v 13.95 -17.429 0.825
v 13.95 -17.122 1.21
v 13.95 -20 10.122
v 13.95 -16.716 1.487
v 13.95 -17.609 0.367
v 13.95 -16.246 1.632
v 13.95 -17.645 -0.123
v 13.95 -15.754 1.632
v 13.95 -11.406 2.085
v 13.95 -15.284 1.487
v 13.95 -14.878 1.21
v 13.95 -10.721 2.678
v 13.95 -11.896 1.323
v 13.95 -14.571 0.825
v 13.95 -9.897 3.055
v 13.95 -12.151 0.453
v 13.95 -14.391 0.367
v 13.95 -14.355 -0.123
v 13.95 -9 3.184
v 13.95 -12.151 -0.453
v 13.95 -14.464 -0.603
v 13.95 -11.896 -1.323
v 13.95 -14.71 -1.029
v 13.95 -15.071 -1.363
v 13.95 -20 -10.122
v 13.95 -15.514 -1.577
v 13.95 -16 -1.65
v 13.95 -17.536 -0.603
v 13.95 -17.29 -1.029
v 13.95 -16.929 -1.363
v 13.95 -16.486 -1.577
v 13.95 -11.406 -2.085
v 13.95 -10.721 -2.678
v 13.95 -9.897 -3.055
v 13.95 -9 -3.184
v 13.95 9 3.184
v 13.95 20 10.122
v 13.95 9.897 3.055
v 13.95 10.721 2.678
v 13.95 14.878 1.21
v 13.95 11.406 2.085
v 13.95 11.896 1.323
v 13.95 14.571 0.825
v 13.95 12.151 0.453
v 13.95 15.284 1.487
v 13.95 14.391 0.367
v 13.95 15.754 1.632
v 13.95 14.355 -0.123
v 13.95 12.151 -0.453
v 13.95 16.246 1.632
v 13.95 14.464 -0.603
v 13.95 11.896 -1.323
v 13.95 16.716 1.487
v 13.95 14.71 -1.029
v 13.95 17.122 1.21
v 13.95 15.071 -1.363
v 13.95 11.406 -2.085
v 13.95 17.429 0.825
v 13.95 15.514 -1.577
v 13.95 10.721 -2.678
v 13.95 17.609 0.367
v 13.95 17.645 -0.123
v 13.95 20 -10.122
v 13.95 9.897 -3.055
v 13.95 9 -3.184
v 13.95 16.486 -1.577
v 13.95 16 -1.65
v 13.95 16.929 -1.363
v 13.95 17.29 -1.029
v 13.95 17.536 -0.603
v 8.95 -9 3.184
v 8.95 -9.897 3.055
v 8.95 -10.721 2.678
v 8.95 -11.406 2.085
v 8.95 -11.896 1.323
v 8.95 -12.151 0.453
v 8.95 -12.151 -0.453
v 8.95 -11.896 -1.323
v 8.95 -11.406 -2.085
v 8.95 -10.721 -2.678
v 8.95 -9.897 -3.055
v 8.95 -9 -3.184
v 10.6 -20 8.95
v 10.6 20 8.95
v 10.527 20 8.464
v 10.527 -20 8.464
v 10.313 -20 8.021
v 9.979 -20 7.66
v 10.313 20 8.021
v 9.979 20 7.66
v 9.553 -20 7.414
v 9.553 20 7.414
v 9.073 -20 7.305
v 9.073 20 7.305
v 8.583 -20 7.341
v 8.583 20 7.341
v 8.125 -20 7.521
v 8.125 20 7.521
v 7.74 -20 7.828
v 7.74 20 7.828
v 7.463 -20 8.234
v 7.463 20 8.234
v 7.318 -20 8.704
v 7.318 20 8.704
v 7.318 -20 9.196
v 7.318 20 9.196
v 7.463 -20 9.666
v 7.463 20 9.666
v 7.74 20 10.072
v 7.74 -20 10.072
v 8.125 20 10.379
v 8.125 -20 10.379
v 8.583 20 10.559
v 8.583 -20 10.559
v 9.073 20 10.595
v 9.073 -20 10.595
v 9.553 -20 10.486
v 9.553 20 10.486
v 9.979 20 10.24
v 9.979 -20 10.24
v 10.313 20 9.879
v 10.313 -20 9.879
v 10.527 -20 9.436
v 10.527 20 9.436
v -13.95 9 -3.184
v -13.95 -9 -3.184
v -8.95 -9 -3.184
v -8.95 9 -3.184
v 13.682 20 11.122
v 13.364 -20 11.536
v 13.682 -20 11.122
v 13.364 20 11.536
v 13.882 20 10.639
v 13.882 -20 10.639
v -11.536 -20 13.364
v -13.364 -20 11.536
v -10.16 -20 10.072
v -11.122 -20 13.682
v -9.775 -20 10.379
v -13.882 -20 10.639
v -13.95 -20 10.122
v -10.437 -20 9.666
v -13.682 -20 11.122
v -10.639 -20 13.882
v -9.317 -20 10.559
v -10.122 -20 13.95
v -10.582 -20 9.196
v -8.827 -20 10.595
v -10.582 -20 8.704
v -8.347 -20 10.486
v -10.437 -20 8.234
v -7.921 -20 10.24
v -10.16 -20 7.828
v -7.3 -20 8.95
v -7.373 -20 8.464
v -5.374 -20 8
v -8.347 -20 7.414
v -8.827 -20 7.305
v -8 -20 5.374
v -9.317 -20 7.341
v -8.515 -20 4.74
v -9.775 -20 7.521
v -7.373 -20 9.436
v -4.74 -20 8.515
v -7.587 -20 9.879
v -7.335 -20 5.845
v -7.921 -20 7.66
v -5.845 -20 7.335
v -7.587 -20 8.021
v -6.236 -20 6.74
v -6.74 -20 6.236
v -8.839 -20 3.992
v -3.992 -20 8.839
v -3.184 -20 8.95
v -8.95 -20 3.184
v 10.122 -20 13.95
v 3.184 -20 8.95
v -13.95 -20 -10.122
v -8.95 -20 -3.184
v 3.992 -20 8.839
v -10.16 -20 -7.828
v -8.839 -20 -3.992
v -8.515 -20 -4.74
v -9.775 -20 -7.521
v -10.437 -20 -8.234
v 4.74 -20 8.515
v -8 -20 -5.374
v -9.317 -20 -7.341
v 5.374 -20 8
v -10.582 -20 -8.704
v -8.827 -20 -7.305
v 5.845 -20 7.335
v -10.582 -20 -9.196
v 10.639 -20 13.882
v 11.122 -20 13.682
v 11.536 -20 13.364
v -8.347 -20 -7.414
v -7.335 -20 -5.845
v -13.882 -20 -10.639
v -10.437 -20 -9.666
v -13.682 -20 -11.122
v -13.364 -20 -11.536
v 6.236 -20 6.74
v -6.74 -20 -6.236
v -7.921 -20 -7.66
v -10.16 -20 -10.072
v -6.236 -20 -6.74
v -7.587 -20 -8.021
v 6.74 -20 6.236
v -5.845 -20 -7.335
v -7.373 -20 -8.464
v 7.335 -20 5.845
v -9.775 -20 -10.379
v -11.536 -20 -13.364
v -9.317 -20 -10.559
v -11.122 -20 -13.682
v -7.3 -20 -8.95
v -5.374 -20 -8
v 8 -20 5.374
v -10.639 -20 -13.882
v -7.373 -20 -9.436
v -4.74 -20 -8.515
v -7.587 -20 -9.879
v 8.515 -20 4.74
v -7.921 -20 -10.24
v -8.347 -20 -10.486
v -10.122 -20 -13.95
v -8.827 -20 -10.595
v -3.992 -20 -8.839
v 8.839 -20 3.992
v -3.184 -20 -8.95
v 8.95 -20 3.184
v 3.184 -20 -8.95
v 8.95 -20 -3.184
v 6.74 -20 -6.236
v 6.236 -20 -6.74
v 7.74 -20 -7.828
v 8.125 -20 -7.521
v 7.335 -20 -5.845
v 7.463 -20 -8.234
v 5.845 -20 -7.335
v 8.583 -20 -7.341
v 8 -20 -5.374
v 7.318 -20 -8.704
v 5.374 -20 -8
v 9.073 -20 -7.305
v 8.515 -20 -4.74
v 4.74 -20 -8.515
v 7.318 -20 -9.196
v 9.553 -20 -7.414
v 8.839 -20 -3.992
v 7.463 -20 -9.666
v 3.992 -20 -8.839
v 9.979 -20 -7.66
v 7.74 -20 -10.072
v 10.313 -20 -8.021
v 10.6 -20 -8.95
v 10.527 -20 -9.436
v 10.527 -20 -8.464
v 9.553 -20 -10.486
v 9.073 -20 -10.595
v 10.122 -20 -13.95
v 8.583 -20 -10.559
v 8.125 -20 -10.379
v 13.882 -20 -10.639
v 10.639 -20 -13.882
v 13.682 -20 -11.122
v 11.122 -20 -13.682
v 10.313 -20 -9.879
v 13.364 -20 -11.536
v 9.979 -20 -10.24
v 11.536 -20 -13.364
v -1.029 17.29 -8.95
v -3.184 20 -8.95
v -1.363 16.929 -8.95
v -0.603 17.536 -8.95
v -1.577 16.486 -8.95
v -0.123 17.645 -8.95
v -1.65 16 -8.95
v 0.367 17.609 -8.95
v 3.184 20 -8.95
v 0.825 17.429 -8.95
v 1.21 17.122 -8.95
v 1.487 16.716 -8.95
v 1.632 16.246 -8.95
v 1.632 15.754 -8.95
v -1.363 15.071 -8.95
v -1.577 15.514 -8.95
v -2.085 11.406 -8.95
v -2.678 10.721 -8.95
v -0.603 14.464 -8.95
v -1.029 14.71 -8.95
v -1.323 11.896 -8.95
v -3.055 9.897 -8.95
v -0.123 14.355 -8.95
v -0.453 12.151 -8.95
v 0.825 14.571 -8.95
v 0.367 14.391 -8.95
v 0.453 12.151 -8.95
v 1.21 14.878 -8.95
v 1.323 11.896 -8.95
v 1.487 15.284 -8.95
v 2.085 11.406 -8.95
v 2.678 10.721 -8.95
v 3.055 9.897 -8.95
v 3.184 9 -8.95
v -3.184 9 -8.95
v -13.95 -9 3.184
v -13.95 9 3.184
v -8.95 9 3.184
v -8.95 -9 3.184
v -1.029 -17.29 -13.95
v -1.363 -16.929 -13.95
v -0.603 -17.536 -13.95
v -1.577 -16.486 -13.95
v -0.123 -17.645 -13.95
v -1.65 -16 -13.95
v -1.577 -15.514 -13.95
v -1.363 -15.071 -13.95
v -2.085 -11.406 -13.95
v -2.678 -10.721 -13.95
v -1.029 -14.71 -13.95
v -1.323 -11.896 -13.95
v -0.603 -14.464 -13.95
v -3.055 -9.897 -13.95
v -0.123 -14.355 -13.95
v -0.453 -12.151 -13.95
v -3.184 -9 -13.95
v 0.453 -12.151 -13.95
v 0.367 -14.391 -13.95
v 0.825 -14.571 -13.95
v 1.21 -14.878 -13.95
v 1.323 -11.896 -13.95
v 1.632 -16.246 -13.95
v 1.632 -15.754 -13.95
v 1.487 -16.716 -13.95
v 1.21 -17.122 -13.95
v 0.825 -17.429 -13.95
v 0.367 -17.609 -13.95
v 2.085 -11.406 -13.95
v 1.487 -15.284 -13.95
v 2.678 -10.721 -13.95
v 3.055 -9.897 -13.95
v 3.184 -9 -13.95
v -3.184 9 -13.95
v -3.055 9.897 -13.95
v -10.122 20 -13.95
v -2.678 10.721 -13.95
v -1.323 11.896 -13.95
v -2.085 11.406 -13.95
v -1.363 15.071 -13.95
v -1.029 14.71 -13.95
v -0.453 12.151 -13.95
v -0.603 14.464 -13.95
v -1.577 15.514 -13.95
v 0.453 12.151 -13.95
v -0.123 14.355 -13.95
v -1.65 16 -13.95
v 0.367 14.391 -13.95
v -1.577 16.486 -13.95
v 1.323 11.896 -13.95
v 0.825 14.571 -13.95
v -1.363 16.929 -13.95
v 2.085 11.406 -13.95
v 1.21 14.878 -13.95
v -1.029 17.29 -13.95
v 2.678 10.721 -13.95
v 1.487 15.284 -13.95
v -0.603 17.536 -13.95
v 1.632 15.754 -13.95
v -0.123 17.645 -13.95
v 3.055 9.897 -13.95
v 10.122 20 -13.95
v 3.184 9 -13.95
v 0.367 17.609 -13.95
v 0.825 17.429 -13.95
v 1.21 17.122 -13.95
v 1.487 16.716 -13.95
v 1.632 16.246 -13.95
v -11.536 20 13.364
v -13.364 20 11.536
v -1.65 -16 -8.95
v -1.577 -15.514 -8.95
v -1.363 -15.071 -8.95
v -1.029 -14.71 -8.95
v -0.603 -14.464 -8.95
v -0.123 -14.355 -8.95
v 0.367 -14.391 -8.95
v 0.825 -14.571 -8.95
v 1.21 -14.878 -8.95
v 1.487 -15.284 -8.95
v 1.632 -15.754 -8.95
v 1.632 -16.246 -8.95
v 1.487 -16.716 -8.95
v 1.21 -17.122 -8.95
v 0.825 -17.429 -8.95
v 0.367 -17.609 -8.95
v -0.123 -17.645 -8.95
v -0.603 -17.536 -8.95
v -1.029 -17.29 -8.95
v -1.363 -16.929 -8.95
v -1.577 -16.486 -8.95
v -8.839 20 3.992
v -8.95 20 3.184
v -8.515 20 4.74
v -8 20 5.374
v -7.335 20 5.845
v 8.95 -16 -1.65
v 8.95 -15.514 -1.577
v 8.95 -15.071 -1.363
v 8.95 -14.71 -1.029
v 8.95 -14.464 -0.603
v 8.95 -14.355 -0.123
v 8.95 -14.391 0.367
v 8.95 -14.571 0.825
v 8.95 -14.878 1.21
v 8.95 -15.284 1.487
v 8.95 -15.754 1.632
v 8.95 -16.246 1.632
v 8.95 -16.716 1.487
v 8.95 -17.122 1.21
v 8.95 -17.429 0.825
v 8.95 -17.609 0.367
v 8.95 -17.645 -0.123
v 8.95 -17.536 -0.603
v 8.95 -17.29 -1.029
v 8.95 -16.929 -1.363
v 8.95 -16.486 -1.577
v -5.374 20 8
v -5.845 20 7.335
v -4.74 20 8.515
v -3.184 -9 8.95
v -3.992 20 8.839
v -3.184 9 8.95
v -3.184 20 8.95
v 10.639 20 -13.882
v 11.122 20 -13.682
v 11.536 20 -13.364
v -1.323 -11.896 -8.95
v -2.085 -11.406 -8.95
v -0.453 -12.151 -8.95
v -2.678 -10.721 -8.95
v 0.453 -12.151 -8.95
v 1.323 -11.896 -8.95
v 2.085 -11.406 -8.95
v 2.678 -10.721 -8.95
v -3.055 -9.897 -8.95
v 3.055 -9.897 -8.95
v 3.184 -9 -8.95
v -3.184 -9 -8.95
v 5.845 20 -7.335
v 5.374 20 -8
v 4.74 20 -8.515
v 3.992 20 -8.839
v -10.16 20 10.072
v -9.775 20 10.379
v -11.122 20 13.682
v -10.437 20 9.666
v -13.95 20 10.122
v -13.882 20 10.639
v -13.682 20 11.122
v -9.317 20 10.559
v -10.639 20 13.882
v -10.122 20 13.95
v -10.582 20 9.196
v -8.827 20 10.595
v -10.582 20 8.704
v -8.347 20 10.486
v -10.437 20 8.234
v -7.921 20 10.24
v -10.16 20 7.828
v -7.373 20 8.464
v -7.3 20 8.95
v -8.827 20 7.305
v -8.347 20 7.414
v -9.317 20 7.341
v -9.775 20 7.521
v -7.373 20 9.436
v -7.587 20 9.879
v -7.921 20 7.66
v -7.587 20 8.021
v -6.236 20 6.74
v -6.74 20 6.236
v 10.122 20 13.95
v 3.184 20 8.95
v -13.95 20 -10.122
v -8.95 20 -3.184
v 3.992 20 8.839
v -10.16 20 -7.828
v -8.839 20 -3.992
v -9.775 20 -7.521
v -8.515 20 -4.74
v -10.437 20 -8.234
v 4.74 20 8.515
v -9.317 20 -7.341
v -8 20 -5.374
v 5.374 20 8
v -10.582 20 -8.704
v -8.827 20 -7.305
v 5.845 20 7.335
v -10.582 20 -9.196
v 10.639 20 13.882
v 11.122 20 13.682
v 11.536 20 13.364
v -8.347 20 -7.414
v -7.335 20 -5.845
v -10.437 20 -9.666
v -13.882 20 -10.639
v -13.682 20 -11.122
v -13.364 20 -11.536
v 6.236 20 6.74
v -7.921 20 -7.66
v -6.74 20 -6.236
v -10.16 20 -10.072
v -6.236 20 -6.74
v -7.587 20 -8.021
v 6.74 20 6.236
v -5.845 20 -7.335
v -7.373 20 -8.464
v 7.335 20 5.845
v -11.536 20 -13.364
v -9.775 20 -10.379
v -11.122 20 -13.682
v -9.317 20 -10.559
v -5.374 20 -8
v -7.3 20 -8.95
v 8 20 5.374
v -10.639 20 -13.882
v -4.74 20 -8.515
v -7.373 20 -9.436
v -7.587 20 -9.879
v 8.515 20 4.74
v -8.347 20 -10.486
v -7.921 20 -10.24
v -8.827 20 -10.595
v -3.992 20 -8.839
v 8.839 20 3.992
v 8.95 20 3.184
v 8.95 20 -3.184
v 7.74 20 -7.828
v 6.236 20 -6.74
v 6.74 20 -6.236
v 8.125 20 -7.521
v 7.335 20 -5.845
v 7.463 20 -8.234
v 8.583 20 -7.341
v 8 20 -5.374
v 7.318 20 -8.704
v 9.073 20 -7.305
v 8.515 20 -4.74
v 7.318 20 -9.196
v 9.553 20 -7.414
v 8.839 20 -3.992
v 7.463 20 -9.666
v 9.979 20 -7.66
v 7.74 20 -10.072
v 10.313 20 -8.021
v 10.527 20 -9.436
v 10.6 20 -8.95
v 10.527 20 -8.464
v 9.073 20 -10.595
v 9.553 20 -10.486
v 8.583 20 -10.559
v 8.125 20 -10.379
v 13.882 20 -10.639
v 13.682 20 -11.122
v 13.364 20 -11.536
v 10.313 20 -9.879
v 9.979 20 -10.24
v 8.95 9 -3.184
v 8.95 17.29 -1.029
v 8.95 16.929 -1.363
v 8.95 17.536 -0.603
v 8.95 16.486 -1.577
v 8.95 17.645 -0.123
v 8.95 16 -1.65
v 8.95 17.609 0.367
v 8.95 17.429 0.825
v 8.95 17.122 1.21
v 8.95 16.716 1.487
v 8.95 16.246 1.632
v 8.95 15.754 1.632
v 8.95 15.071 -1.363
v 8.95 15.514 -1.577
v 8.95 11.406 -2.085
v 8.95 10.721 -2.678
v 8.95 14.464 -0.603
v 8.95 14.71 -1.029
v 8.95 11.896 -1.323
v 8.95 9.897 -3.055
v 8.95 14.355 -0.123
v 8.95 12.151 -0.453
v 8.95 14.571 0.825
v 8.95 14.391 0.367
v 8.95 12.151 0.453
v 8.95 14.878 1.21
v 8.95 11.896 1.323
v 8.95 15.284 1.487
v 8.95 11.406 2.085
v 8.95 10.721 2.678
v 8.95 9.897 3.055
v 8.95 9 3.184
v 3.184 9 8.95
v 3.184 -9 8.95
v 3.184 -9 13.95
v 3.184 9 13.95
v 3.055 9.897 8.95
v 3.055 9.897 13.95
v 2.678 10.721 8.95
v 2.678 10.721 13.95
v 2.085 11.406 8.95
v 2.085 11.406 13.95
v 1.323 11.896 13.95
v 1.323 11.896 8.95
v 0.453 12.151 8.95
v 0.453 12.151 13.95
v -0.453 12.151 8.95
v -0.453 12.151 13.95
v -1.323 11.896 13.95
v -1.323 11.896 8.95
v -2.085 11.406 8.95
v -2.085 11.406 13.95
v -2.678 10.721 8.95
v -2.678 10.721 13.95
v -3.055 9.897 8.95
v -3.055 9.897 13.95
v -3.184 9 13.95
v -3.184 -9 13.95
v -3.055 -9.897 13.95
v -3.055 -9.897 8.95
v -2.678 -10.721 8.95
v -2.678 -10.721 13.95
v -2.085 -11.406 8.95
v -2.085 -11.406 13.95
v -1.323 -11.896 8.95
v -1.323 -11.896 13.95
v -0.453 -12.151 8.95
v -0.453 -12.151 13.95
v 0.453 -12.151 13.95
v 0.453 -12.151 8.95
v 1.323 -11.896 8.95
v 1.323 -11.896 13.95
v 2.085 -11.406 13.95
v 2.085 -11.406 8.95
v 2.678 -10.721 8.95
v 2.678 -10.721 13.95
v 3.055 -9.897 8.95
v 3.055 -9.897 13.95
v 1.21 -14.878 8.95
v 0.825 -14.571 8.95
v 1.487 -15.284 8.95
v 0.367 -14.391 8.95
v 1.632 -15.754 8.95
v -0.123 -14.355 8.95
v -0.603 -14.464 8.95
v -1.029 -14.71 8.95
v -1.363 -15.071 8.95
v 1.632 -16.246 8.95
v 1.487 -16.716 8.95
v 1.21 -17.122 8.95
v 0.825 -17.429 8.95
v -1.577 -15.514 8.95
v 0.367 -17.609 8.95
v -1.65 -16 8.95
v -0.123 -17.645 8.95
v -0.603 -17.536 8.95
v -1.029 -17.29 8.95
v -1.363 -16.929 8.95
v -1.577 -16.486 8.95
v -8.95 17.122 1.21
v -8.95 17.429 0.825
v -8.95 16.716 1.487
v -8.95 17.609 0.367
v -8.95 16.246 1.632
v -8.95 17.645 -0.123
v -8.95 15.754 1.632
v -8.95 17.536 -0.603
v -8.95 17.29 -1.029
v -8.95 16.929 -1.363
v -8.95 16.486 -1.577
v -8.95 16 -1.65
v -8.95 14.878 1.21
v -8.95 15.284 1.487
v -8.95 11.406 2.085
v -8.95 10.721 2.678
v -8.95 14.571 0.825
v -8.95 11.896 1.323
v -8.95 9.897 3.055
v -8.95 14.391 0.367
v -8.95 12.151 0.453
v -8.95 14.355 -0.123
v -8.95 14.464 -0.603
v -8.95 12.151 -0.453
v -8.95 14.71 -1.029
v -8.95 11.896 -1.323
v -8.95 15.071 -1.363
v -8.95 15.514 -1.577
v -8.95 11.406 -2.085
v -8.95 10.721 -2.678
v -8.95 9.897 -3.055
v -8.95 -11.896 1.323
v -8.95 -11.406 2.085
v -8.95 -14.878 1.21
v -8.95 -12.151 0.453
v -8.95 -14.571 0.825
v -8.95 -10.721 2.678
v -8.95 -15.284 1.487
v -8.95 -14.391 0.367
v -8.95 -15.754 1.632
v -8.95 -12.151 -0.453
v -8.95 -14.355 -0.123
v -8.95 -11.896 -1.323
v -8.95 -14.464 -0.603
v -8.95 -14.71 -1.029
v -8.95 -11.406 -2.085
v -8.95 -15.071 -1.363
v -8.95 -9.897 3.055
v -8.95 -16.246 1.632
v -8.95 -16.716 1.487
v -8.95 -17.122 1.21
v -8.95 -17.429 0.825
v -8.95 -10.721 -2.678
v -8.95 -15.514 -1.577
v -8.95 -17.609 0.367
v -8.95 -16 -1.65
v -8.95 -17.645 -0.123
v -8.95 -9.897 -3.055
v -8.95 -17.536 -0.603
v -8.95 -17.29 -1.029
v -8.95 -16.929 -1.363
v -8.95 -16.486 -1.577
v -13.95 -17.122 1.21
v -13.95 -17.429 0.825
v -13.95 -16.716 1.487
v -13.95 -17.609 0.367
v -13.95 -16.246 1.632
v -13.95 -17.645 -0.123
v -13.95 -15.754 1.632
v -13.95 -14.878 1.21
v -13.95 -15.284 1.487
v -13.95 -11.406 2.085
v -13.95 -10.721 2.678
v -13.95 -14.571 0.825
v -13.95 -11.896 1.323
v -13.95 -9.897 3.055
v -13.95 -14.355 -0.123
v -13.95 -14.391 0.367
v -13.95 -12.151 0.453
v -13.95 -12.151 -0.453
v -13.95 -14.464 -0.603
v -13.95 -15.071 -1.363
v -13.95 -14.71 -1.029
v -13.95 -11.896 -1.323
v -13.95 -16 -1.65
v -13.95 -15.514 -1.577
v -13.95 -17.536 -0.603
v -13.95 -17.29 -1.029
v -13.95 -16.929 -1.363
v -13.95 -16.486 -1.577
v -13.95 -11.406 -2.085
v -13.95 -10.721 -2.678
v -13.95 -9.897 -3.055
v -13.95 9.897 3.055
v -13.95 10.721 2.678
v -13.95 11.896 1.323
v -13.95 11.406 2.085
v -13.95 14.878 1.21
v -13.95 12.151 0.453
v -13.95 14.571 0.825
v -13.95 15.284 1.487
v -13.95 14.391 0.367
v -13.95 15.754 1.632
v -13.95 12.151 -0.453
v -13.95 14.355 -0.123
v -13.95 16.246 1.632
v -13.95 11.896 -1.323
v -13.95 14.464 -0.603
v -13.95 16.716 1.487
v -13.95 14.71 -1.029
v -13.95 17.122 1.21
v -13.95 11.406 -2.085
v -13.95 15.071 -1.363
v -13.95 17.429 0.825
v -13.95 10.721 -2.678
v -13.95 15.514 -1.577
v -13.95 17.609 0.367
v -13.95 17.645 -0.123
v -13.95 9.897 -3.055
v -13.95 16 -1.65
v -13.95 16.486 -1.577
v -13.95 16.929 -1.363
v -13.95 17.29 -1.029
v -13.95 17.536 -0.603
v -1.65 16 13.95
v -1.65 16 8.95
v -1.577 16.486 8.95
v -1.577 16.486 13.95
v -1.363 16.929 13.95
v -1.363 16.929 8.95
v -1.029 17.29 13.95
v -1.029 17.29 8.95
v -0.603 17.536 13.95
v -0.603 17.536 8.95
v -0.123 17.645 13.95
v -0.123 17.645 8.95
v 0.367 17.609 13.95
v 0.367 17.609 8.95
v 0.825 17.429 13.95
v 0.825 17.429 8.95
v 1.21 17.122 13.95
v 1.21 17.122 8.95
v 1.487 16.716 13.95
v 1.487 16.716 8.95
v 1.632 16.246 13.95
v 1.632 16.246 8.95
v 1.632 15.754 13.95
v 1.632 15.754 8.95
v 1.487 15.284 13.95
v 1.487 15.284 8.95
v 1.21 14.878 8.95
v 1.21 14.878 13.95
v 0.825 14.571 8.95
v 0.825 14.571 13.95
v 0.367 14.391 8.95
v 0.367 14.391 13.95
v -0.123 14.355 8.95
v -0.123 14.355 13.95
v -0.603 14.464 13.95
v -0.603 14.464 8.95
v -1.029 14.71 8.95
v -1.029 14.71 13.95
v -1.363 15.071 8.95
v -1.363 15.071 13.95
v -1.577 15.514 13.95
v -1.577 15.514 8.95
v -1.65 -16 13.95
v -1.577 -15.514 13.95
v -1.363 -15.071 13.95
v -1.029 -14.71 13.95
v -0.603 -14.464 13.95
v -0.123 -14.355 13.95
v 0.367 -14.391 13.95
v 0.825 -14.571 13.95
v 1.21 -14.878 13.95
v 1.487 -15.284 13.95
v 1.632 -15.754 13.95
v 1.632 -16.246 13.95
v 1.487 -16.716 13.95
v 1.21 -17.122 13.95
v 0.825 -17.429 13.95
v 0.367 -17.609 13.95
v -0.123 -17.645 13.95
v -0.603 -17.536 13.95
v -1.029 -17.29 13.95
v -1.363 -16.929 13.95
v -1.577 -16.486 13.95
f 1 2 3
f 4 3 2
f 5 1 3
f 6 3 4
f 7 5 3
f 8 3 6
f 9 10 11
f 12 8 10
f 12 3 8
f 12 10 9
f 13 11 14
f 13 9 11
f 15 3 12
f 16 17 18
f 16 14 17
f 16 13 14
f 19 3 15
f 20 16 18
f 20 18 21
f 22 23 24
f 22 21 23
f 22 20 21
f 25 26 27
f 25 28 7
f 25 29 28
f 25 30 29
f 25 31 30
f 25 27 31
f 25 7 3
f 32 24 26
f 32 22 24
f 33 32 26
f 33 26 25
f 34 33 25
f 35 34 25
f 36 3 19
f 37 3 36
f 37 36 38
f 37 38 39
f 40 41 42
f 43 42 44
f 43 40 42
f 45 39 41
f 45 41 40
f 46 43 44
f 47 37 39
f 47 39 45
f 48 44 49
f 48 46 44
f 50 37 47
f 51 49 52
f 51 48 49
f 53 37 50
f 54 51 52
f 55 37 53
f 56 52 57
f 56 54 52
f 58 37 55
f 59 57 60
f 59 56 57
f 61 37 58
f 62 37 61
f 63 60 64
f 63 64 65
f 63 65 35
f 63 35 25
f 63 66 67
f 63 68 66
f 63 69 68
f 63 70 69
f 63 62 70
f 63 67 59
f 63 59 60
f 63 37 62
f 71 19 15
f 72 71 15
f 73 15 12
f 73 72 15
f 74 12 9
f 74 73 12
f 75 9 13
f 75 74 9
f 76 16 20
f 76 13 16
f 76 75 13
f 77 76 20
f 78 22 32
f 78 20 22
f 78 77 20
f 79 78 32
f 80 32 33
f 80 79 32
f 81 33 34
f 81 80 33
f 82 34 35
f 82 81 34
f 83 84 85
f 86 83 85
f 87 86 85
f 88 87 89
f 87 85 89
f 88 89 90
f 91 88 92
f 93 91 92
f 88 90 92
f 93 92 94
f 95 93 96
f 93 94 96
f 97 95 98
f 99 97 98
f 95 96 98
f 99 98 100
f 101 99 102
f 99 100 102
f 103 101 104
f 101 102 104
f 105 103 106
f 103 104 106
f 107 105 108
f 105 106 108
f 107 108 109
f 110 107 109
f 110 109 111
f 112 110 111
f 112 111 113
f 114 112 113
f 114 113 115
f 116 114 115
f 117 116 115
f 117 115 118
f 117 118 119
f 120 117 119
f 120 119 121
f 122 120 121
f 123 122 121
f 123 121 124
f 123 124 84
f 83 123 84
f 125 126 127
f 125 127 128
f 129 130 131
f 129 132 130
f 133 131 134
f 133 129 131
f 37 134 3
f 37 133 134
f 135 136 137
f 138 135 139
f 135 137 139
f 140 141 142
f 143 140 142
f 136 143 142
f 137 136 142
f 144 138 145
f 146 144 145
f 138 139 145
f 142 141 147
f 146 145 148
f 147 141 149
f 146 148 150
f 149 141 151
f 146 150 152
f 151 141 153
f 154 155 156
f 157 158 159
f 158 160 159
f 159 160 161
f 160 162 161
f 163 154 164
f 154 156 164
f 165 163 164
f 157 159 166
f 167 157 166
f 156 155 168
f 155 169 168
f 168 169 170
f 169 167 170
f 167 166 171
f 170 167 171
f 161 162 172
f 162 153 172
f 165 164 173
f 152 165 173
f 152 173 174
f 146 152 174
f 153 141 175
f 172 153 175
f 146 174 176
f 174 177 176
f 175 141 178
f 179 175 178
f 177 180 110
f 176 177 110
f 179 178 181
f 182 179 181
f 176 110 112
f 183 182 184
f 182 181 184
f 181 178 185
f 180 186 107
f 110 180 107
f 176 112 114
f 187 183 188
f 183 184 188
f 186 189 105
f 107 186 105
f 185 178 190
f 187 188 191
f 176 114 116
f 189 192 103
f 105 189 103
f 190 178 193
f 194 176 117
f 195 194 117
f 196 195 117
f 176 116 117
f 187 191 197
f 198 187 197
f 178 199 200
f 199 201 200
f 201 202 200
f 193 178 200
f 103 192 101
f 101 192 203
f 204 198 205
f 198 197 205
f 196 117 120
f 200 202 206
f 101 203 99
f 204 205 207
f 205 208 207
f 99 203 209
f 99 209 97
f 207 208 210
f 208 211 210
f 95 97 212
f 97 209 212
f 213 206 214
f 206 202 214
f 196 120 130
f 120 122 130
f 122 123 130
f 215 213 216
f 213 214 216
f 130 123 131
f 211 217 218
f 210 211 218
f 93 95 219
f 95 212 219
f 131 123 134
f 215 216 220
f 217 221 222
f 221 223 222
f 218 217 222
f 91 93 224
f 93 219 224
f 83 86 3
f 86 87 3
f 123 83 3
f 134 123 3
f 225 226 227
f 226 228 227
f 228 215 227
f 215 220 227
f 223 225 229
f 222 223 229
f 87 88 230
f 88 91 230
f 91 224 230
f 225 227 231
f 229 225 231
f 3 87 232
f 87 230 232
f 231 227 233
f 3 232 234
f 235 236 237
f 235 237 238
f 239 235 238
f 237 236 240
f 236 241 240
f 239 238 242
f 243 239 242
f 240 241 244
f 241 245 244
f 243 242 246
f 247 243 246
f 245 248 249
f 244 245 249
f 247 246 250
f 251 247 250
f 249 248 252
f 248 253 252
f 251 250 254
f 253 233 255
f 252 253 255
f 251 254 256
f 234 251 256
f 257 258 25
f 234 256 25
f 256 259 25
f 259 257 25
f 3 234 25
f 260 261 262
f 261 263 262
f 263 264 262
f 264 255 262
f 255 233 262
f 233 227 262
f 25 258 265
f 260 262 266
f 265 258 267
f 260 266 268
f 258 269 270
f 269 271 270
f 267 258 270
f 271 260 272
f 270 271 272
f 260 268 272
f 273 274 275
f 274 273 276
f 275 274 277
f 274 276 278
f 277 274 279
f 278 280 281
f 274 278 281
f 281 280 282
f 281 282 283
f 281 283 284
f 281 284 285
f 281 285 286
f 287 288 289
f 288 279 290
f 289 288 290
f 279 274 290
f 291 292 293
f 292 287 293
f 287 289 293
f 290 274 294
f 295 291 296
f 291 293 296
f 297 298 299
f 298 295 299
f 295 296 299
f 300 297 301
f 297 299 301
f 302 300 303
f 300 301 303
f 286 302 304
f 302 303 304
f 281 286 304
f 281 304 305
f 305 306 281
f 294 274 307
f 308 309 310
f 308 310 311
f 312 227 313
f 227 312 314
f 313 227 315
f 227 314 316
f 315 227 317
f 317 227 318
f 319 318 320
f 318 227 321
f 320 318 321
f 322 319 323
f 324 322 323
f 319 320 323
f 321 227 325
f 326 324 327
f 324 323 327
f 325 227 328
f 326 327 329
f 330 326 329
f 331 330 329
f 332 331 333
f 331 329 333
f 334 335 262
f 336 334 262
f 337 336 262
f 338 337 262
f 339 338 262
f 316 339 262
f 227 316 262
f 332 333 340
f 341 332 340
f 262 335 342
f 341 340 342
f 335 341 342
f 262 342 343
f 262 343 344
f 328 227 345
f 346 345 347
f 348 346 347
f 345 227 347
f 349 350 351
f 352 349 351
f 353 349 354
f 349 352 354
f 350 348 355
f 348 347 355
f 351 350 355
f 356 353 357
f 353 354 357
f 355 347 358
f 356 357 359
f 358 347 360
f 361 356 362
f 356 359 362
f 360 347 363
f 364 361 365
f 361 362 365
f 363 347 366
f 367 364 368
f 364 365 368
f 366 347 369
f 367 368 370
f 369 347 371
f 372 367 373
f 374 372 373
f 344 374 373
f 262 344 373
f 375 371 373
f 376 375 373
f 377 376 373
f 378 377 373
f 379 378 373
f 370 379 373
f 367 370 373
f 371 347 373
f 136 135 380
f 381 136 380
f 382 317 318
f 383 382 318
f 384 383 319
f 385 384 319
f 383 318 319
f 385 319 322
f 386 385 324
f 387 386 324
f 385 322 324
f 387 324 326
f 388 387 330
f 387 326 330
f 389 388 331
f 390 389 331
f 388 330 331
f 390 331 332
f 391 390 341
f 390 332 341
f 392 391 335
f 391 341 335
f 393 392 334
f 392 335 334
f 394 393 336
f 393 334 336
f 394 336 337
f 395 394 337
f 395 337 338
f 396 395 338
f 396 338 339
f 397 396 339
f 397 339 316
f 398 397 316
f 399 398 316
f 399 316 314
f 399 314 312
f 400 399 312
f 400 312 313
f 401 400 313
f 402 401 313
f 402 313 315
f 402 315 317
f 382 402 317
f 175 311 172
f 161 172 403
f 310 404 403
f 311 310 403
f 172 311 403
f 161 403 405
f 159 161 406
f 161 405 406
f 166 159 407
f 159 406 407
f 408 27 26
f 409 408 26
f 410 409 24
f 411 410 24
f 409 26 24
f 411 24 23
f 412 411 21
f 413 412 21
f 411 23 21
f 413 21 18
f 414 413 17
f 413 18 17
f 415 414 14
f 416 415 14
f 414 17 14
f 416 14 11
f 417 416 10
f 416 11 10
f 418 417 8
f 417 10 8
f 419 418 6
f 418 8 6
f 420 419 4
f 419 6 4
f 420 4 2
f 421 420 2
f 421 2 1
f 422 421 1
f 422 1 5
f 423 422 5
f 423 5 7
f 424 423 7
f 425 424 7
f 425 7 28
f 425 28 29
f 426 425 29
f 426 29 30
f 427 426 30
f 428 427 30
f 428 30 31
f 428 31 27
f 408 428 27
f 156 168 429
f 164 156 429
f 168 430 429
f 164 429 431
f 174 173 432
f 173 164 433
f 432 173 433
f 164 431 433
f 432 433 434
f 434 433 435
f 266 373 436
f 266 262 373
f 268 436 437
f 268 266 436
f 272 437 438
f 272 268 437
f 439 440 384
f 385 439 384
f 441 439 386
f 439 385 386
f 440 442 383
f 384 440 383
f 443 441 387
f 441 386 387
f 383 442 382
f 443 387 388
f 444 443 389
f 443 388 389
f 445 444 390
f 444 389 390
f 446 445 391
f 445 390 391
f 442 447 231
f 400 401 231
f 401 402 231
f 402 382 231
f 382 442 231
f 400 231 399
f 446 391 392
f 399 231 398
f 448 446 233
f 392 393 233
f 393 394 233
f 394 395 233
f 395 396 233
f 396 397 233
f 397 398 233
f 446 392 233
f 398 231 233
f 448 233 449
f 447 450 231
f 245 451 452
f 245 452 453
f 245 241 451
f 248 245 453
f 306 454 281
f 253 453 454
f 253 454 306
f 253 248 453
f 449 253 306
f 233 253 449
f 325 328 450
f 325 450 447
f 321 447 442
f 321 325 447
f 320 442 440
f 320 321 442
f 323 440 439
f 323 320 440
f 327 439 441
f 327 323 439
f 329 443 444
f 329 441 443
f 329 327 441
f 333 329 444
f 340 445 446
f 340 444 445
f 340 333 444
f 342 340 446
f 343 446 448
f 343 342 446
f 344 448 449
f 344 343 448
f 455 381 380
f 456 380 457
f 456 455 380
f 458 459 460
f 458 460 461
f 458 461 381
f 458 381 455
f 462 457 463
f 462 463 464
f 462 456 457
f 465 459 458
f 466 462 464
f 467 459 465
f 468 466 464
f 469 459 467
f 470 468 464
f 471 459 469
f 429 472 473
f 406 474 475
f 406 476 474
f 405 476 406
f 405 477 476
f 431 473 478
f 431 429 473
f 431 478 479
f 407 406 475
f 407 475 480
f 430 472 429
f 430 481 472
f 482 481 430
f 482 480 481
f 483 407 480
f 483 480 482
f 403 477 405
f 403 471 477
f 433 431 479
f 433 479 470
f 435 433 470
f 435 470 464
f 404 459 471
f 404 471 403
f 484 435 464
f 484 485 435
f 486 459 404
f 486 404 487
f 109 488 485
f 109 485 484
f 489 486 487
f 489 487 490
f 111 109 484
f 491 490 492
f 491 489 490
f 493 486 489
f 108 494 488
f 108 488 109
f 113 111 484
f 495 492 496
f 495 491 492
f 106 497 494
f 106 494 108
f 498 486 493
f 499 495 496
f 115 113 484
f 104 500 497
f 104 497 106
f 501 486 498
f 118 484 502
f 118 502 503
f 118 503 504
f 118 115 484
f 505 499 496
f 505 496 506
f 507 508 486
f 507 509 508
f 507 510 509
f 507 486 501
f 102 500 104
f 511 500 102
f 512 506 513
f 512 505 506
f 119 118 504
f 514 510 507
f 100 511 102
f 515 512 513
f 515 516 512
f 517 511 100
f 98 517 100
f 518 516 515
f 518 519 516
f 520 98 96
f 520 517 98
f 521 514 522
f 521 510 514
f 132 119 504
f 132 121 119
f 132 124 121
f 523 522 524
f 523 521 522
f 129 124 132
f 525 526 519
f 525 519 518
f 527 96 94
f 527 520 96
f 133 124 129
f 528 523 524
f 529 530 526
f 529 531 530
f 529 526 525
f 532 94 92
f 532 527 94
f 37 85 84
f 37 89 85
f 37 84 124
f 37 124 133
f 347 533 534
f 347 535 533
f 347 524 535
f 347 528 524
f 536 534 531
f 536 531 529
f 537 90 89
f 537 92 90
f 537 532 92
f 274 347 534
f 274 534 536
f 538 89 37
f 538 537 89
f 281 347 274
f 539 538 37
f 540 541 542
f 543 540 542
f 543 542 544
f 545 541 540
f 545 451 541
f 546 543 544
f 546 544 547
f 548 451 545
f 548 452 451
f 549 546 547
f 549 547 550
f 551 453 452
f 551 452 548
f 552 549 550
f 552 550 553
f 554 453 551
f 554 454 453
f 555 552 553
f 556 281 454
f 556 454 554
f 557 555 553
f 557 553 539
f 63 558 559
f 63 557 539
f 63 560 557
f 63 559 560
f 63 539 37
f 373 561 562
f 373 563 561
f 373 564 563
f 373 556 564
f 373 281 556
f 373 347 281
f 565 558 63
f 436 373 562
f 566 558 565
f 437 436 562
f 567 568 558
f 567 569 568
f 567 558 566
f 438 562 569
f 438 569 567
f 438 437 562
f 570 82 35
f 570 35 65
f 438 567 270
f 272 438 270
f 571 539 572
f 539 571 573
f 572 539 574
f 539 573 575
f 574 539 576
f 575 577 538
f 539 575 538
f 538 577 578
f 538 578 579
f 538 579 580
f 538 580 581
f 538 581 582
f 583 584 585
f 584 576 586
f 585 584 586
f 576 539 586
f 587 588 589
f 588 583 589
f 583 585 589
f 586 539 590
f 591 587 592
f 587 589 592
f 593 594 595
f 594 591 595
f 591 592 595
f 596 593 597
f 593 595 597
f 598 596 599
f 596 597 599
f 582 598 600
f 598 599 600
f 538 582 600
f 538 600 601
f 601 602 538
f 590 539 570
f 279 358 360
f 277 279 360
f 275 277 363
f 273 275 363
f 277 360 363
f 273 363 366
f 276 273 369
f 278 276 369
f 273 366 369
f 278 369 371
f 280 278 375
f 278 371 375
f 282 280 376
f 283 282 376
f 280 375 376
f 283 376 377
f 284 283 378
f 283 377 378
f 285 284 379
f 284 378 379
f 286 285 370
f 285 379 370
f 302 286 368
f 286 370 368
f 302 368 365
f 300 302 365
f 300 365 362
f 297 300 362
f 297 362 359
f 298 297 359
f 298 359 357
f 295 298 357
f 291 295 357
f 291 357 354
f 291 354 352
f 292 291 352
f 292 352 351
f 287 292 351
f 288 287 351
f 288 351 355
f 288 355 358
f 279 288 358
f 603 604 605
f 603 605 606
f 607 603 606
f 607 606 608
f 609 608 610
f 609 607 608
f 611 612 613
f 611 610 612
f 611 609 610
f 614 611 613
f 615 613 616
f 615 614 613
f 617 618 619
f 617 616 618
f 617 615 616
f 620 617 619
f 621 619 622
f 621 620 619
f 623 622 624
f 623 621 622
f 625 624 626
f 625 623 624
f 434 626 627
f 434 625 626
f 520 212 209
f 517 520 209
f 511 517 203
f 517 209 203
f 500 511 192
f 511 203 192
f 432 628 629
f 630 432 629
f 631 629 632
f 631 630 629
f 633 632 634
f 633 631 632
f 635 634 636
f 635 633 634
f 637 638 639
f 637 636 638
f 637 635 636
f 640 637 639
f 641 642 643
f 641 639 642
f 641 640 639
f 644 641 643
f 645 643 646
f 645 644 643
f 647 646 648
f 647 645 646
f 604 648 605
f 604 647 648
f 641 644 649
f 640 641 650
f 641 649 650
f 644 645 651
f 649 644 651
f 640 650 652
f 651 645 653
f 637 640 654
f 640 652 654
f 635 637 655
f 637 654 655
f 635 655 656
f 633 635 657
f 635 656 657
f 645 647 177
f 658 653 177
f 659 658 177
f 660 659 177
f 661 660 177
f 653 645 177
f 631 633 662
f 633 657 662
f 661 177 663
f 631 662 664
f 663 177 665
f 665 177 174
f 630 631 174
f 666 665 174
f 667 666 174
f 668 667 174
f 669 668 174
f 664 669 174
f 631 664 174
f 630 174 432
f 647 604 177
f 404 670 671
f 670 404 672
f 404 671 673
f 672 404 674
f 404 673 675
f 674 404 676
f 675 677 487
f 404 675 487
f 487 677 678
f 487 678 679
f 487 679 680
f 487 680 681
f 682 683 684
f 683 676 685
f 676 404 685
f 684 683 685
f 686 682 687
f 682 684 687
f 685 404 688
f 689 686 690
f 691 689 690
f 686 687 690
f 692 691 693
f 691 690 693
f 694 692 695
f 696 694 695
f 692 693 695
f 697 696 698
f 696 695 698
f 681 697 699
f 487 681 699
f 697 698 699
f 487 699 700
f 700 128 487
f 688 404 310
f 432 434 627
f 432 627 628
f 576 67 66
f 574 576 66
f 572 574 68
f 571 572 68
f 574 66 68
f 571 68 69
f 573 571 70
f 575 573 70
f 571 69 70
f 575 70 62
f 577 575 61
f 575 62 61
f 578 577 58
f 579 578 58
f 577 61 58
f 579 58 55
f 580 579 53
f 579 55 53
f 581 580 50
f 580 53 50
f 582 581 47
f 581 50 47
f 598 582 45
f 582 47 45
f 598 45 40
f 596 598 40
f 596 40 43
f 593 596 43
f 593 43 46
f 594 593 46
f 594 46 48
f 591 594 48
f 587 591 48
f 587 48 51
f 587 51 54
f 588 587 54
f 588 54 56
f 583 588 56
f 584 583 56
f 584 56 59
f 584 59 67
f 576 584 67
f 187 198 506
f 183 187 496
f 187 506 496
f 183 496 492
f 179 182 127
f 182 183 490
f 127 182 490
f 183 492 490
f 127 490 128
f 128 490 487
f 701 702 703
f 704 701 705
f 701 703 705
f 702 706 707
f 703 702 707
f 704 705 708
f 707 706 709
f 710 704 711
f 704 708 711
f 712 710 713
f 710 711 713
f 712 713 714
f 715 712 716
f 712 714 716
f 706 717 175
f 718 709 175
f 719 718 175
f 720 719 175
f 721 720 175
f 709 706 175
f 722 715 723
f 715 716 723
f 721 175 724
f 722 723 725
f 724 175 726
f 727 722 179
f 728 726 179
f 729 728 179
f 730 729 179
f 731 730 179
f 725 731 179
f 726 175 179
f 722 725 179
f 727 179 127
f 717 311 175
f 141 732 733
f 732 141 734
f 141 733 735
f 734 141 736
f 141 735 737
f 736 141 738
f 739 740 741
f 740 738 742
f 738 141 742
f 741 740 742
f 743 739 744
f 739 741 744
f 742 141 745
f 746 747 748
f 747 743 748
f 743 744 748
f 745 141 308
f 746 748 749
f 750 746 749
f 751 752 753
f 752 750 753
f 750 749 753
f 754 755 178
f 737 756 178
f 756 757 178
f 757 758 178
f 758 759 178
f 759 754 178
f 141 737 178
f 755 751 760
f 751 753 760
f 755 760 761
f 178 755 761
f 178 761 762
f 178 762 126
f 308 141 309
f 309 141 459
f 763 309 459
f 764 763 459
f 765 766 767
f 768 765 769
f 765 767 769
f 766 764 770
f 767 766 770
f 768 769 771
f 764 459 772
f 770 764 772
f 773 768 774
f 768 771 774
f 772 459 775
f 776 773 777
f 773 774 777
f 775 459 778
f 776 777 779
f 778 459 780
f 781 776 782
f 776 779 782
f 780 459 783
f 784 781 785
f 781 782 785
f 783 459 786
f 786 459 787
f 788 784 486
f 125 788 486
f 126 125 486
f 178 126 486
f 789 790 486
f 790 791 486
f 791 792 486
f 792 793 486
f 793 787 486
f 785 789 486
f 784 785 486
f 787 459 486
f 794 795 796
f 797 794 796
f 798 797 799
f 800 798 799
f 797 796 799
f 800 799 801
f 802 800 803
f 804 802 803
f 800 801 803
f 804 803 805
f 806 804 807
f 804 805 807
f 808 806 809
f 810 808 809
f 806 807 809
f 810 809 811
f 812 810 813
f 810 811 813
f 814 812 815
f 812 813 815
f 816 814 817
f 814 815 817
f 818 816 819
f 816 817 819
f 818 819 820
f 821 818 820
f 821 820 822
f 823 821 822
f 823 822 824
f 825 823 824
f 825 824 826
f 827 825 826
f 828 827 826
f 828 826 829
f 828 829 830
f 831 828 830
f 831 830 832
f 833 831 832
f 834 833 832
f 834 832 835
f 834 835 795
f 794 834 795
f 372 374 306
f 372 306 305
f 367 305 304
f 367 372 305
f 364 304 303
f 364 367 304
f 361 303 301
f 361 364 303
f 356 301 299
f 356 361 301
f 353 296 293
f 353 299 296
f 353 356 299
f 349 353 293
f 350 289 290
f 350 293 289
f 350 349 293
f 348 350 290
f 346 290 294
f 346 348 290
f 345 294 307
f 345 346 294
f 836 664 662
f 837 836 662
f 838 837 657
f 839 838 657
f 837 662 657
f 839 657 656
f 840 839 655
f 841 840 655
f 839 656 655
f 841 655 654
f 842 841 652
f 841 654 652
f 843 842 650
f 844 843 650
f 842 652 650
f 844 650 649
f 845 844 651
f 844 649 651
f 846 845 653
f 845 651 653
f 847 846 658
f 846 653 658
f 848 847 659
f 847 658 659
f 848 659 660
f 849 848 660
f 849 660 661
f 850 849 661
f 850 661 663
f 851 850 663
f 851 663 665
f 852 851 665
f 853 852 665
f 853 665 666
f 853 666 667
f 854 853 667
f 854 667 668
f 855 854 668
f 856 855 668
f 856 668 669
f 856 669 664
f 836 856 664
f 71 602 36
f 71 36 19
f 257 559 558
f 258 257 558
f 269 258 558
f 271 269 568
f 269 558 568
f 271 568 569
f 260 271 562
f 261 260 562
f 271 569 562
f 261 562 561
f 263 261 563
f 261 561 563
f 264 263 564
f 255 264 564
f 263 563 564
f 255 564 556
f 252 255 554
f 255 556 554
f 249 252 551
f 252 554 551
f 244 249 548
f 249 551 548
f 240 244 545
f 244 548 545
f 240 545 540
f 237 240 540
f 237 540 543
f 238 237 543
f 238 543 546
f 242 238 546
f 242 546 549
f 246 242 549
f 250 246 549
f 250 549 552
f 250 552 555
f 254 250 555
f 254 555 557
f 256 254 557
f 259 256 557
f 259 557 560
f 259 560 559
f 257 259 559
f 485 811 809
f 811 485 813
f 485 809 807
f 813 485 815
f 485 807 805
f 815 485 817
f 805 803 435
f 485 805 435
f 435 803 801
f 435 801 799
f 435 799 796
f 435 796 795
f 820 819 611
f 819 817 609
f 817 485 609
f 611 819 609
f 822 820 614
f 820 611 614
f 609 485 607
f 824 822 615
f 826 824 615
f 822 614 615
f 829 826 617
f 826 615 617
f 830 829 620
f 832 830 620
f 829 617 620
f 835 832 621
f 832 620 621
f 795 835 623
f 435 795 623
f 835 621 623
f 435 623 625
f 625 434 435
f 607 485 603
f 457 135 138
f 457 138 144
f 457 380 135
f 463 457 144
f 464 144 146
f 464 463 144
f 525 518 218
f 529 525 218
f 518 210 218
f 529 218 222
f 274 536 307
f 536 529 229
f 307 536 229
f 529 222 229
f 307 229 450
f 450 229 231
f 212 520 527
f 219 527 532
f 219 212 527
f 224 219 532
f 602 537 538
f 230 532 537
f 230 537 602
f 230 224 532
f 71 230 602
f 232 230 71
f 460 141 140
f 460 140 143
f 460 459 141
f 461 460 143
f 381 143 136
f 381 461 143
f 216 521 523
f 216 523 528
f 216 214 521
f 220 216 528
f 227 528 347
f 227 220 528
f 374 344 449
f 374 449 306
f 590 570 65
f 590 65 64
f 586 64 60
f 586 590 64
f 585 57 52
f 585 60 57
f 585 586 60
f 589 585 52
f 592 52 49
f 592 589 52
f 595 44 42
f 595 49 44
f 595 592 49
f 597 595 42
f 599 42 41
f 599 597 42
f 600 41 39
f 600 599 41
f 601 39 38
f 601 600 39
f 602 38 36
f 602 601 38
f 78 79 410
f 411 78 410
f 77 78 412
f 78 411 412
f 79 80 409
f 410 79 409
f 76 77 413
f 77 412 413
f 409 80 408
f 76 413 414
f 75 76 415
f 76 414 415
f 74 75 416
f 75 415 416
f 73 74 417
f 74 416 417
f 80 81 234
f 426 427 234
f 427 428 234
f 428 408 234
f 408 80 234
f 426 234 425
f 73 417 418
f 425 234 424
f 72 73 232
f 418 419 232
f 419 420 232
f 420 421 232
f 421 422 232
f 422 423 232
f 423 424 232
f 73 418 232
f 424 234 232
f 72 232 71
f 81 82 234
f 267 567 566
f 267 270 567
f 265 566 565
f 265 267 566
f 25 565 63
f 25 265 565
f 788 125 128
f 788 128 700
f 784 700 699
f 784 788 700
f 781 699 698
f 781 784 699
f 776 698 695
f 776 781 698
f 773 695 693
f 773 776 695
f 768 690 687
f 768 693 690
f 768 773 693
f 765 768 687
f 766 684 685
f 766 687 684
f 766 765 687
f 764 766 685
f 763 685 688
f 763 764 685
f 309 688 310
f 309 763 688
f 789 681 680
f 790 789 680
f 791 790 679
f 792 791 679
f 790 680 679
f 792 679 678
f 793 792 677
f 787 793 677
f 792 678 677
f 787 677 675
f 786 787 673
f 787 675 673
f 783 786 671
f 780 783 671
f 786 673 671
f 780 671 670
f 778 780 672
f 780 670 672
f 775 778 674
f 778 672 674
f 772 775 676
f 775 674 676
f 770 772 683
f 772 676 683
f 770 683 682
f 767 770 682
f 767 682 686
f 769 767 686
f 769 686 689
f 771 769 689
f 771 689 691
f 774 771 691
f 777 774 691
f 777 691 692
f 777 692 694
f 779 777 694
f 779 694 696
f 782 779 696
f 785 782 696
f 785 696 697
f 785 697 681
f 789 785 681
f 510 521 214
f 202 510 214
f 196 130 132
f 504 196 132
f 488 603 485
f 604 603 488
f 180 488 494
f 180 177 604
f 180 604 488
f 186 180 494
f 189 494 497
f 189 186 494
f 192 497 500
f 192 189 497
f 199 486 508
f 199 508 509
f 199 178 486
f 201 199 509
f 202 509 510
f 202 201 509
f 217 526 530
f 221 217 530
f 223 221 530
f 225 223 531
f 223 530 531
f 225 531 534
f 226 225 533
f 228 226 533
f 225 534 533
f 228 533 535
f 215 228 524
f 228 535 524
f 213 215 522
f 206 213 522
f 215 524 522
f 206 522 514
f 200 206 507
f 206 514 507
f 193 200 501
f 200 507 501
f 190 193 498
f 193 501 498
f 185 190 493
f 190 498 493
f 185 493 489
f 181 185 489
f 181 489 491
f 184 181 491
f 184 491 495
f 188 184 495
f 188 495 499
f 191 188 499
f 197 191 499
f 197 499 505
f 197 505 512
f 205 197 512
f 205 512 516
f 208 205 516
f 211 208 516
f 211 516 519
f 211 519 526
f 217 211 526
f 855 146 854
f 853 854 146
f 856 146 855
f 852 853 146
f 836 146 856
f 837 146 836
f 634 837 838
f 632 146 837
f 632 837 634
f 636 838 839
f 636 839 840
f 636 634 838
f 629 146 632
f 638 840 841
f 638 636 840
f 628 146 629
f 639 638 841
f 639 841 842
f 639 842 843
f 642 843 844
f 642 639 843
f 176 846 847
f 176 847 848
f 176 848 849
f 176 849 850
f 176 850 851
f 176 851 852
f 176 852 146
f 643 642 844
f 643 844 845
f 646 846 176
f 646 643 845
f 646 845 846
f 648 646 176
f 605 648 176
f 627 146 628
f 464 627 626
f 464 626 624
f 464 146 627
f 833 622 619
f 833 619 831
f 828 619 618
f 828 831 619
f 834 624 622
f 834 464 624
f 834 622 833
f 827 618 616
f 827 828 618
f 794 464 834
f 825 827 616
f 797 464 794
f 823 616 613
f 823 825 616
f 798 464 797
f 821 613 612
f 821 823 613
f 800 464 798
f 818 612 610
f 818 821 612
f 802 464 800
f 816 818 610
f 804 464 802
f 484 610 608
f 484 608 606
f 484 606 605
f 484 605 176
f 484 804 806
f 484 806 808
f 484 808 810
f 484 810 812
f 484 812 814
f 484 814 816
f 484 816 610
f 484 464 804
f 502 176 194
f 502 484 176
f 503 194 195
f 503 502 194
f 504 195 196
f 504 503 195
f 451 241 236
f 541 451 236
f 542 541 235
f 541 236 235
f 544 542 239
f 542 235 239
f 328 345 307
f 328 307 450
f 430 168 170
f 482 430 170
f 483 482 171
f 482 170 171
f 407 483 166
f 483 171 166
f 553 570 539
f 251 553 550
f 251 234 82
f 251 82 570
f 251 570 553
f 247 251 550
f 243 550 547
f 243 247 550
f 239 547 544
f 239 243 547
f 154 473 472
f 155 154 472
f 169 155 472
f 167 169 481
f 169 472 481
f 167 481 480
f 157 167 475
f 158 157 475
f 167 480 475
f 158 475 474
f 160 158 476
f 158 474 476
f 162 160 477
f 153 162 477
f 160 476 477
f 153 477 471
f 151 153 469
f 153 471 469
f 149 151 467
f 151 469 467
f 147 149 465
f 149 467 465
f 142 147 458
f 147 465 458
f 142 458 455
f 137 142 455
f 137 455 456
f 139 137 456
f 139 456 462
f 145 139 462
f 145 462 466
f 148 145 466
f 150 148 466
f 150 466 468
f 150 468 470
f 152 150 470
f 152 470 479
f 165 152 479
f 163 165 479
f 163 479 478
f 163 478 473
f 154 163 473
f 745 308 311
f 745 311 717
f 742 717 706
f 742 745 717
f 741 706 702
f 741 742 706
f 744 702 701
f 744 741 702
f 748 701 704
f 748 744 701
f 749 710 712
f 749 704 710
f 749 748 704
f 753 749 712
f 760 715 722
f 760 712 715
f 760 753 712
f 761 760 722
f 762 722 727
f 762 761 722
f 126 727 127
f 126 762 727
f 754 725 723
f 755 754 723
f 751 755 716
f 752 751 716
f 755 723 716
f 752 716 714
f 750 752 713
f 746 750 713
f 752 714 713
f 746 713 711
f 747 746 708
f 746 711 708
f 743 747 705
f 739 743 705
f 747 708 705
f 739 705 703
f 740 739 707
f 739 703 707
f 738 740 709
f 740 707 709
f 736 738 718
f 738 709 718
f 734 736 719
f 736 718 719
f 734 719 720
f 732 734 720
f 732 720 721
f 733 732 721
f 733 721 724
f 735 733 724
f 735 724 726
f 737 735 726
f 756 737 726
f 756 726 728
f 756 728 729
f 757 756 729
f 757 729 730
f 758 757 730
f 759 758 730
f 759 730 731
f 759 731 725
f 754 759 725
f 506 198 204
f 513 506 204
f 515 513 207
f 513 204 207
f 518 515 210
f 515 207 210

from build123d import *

# Parameters (mm, degrees)
SKETCH_1_W          = 27.9
SKETCH_1_H          = 27.9
EXTRUDE_1_DEPTH     = 20
HOLE_WIZARD_M4_2_D  = 3.3
CUT_EXTRUDE_1_DEPTH = 46
CHAMFER_1_SIZE      = 3
HOLE_WIZARD_M4_3_D  = 3.3
HOLE_WIZARD_M4_4_D  = 3.3
FILLET_1_R          = 2
FILLET_2_R          = 3
CUT_EXTRUDE_2_DEPTH = 46
CUT_EXTRUDE_3_DEPTH = 46


with BuildPart() as part:
    # 草图1 → 凸台-拉伸1 (new, symmetric)
    with BuildSketch(Plane(origin=(0, 0, 0), x_dir=(1, 0, 0), z_dir=(0, 1, 0))):
        Rectangle(SKETCH_1_W, SKETCH_1_H)
    extrude(amount=EXTRUDE_1_DEPTH, both=True)

    # M4 螺纹孔2 (through all)
    with Locations(Plane(origin=(0, -20, 0), x_dir=(-1, 0, 0), z_dir=(0, -1, 0))):
        with Locations((8.95, -8.95), (8.95, 8.95), (-8.95, 8.95), (-8.95, -8.95)):
            Hole(HOLE_WIZARD_M4_2_D / 2)

    # 草图8 → 切除-拉伸1 (cut, symmetric)
    with BuildSketch(Plane.XZ.offset(20)):
        with BuildLine():
            ThreePointArc((-8.95, -5.45), (-6.475126266, -6.475126266), (-5.45, -8.95))
            Line((-5.45, -8.95), (5.45, -8.95))
            ThreePointArc((5.45, -8.95), (6.475126266, -6.475126266), (8.95, -5.45))
            Line((8.95, -5.45), (8.95, 5.45))
            ThreePointArc((8.95, 5.45), (6.475126266, 6.475126266), (5.45, 8.95))
            Line((5.45, 8.95), (-5.45, 8.95))
            ThreePointArc((-5.45, 8.95), (-6.475126266, 6.475126266), (-8.95, 5.45))
            Line((-8.95, 5.45), (-8.95, -5.45))
        make_face()
    extrude(amount=CUT_EXTRUDE_1_DEPTH, both=True, mode=Mode.SUBTRACT)

    # 倒角1
    chamfer_1_edges = [part.edges().sort_by_distance(p)[0] for p in [
        (13.95, 0, 13.95),
        (-13.95, 0, 13.95),
        (-13.95, 0, -13.95),
        (13.95, 0, -13.95),
    ]]
    chamfer(chamfer_1_edges, length=CHAMFER_1_SIZE)

    # M4 螺纹孔3 (through all)
    with Locations(Plane.ZY.offset(13.95)):
        with Locations((0, 16), (0, -16)):
            Hole(HOLE_WIZARD_M4_3_D / 2)

    # M4 螺纹孔4 (through all)
    with Locations(Plane.XY.offset(13.95)):
        with Locations((0, 16), (0, -16)):
            Hole(HOLE_WIZARD_M4_4_D / 2)

    # 圆角1
    fillet_1_edges = [part.edges().sort_by_distance(p)[0] for p in [
        (-13.95, 0, 10.95),
        (-13.95, 0, -10.95),
        (13.95, 0, -10.95),
        (13.95, 0, 10.95),
        (-10.95, 0, 13.95),
        (10.95, 0, 13.95),
        (-10.95, 0, -13.95),
        (10.95, 0, -13.95),
    ]]
    fillet(fillet_1_edges, radius=FILLET_1_R)

    # 圆角2
    fillet_2_edges = [part.edges().sort_by_distance(p)[0] for p in [
        (-8.95, 0, 5.45),
        (-5.45, 0, 8.95),
        (5.45, 0, 8.95),
        (8.95, 0, 5.45),
        (8.95, 0, -5.45),
        (5.45, 0, -8.95),
        (-5.45, 0, -8.95),
        (-8.95, 0, -5.45),
    ]]
    fillet(fillet_2_edges, radius=FILLET_2_R)

    # 草图15 → 切除-拉伸2 (cut, symmetric)
    with BuildSketch(Plane.ZY.offset(13.95)):
        with BuildLine():
            Line((-3.183718703, -9), (-3.183718703, 9))
            ThreePointArc((-3.183718703, 9), (0, 12.183718703), (3.183718703, 9))
            Line((3.183718703, 9), (3.183718703, -9))
            ThreePointArc((3.183718703, -9), (0, -12.183718703), (-3.183718703, -9))
        make_face()
    extrude(amount=CUT_EXTRUDE_2_DEPTH, both=True, mode=Mode.SUBTRACT)

    # 草图16 → 切除-拉伸3 (cut, symmetric)
    with BuildSketch(Plane(origin=(0, 0, -13.95), x_dir=(-1, 0, 0), z_dir=(0, 0, -1))):
        with BuildLine():
            Line((-3.183718703, -9), (-3.183718703, 9))
            ThreePointArc((-3.183718703, 9), (0, 12.183718703), (3.183718703, 9))
            Line((3.183718703, 9), (3.183718703, -9))
            ThreePointArc((3.183718703, -9), (0, -12.183718703), (-3.183718703, -9))
        make_face()
    extrude(amount=CUT_EXTRUDE_3_DEPTH, both=True, mode=Mode.SUBTRACT)


solid = part.part
